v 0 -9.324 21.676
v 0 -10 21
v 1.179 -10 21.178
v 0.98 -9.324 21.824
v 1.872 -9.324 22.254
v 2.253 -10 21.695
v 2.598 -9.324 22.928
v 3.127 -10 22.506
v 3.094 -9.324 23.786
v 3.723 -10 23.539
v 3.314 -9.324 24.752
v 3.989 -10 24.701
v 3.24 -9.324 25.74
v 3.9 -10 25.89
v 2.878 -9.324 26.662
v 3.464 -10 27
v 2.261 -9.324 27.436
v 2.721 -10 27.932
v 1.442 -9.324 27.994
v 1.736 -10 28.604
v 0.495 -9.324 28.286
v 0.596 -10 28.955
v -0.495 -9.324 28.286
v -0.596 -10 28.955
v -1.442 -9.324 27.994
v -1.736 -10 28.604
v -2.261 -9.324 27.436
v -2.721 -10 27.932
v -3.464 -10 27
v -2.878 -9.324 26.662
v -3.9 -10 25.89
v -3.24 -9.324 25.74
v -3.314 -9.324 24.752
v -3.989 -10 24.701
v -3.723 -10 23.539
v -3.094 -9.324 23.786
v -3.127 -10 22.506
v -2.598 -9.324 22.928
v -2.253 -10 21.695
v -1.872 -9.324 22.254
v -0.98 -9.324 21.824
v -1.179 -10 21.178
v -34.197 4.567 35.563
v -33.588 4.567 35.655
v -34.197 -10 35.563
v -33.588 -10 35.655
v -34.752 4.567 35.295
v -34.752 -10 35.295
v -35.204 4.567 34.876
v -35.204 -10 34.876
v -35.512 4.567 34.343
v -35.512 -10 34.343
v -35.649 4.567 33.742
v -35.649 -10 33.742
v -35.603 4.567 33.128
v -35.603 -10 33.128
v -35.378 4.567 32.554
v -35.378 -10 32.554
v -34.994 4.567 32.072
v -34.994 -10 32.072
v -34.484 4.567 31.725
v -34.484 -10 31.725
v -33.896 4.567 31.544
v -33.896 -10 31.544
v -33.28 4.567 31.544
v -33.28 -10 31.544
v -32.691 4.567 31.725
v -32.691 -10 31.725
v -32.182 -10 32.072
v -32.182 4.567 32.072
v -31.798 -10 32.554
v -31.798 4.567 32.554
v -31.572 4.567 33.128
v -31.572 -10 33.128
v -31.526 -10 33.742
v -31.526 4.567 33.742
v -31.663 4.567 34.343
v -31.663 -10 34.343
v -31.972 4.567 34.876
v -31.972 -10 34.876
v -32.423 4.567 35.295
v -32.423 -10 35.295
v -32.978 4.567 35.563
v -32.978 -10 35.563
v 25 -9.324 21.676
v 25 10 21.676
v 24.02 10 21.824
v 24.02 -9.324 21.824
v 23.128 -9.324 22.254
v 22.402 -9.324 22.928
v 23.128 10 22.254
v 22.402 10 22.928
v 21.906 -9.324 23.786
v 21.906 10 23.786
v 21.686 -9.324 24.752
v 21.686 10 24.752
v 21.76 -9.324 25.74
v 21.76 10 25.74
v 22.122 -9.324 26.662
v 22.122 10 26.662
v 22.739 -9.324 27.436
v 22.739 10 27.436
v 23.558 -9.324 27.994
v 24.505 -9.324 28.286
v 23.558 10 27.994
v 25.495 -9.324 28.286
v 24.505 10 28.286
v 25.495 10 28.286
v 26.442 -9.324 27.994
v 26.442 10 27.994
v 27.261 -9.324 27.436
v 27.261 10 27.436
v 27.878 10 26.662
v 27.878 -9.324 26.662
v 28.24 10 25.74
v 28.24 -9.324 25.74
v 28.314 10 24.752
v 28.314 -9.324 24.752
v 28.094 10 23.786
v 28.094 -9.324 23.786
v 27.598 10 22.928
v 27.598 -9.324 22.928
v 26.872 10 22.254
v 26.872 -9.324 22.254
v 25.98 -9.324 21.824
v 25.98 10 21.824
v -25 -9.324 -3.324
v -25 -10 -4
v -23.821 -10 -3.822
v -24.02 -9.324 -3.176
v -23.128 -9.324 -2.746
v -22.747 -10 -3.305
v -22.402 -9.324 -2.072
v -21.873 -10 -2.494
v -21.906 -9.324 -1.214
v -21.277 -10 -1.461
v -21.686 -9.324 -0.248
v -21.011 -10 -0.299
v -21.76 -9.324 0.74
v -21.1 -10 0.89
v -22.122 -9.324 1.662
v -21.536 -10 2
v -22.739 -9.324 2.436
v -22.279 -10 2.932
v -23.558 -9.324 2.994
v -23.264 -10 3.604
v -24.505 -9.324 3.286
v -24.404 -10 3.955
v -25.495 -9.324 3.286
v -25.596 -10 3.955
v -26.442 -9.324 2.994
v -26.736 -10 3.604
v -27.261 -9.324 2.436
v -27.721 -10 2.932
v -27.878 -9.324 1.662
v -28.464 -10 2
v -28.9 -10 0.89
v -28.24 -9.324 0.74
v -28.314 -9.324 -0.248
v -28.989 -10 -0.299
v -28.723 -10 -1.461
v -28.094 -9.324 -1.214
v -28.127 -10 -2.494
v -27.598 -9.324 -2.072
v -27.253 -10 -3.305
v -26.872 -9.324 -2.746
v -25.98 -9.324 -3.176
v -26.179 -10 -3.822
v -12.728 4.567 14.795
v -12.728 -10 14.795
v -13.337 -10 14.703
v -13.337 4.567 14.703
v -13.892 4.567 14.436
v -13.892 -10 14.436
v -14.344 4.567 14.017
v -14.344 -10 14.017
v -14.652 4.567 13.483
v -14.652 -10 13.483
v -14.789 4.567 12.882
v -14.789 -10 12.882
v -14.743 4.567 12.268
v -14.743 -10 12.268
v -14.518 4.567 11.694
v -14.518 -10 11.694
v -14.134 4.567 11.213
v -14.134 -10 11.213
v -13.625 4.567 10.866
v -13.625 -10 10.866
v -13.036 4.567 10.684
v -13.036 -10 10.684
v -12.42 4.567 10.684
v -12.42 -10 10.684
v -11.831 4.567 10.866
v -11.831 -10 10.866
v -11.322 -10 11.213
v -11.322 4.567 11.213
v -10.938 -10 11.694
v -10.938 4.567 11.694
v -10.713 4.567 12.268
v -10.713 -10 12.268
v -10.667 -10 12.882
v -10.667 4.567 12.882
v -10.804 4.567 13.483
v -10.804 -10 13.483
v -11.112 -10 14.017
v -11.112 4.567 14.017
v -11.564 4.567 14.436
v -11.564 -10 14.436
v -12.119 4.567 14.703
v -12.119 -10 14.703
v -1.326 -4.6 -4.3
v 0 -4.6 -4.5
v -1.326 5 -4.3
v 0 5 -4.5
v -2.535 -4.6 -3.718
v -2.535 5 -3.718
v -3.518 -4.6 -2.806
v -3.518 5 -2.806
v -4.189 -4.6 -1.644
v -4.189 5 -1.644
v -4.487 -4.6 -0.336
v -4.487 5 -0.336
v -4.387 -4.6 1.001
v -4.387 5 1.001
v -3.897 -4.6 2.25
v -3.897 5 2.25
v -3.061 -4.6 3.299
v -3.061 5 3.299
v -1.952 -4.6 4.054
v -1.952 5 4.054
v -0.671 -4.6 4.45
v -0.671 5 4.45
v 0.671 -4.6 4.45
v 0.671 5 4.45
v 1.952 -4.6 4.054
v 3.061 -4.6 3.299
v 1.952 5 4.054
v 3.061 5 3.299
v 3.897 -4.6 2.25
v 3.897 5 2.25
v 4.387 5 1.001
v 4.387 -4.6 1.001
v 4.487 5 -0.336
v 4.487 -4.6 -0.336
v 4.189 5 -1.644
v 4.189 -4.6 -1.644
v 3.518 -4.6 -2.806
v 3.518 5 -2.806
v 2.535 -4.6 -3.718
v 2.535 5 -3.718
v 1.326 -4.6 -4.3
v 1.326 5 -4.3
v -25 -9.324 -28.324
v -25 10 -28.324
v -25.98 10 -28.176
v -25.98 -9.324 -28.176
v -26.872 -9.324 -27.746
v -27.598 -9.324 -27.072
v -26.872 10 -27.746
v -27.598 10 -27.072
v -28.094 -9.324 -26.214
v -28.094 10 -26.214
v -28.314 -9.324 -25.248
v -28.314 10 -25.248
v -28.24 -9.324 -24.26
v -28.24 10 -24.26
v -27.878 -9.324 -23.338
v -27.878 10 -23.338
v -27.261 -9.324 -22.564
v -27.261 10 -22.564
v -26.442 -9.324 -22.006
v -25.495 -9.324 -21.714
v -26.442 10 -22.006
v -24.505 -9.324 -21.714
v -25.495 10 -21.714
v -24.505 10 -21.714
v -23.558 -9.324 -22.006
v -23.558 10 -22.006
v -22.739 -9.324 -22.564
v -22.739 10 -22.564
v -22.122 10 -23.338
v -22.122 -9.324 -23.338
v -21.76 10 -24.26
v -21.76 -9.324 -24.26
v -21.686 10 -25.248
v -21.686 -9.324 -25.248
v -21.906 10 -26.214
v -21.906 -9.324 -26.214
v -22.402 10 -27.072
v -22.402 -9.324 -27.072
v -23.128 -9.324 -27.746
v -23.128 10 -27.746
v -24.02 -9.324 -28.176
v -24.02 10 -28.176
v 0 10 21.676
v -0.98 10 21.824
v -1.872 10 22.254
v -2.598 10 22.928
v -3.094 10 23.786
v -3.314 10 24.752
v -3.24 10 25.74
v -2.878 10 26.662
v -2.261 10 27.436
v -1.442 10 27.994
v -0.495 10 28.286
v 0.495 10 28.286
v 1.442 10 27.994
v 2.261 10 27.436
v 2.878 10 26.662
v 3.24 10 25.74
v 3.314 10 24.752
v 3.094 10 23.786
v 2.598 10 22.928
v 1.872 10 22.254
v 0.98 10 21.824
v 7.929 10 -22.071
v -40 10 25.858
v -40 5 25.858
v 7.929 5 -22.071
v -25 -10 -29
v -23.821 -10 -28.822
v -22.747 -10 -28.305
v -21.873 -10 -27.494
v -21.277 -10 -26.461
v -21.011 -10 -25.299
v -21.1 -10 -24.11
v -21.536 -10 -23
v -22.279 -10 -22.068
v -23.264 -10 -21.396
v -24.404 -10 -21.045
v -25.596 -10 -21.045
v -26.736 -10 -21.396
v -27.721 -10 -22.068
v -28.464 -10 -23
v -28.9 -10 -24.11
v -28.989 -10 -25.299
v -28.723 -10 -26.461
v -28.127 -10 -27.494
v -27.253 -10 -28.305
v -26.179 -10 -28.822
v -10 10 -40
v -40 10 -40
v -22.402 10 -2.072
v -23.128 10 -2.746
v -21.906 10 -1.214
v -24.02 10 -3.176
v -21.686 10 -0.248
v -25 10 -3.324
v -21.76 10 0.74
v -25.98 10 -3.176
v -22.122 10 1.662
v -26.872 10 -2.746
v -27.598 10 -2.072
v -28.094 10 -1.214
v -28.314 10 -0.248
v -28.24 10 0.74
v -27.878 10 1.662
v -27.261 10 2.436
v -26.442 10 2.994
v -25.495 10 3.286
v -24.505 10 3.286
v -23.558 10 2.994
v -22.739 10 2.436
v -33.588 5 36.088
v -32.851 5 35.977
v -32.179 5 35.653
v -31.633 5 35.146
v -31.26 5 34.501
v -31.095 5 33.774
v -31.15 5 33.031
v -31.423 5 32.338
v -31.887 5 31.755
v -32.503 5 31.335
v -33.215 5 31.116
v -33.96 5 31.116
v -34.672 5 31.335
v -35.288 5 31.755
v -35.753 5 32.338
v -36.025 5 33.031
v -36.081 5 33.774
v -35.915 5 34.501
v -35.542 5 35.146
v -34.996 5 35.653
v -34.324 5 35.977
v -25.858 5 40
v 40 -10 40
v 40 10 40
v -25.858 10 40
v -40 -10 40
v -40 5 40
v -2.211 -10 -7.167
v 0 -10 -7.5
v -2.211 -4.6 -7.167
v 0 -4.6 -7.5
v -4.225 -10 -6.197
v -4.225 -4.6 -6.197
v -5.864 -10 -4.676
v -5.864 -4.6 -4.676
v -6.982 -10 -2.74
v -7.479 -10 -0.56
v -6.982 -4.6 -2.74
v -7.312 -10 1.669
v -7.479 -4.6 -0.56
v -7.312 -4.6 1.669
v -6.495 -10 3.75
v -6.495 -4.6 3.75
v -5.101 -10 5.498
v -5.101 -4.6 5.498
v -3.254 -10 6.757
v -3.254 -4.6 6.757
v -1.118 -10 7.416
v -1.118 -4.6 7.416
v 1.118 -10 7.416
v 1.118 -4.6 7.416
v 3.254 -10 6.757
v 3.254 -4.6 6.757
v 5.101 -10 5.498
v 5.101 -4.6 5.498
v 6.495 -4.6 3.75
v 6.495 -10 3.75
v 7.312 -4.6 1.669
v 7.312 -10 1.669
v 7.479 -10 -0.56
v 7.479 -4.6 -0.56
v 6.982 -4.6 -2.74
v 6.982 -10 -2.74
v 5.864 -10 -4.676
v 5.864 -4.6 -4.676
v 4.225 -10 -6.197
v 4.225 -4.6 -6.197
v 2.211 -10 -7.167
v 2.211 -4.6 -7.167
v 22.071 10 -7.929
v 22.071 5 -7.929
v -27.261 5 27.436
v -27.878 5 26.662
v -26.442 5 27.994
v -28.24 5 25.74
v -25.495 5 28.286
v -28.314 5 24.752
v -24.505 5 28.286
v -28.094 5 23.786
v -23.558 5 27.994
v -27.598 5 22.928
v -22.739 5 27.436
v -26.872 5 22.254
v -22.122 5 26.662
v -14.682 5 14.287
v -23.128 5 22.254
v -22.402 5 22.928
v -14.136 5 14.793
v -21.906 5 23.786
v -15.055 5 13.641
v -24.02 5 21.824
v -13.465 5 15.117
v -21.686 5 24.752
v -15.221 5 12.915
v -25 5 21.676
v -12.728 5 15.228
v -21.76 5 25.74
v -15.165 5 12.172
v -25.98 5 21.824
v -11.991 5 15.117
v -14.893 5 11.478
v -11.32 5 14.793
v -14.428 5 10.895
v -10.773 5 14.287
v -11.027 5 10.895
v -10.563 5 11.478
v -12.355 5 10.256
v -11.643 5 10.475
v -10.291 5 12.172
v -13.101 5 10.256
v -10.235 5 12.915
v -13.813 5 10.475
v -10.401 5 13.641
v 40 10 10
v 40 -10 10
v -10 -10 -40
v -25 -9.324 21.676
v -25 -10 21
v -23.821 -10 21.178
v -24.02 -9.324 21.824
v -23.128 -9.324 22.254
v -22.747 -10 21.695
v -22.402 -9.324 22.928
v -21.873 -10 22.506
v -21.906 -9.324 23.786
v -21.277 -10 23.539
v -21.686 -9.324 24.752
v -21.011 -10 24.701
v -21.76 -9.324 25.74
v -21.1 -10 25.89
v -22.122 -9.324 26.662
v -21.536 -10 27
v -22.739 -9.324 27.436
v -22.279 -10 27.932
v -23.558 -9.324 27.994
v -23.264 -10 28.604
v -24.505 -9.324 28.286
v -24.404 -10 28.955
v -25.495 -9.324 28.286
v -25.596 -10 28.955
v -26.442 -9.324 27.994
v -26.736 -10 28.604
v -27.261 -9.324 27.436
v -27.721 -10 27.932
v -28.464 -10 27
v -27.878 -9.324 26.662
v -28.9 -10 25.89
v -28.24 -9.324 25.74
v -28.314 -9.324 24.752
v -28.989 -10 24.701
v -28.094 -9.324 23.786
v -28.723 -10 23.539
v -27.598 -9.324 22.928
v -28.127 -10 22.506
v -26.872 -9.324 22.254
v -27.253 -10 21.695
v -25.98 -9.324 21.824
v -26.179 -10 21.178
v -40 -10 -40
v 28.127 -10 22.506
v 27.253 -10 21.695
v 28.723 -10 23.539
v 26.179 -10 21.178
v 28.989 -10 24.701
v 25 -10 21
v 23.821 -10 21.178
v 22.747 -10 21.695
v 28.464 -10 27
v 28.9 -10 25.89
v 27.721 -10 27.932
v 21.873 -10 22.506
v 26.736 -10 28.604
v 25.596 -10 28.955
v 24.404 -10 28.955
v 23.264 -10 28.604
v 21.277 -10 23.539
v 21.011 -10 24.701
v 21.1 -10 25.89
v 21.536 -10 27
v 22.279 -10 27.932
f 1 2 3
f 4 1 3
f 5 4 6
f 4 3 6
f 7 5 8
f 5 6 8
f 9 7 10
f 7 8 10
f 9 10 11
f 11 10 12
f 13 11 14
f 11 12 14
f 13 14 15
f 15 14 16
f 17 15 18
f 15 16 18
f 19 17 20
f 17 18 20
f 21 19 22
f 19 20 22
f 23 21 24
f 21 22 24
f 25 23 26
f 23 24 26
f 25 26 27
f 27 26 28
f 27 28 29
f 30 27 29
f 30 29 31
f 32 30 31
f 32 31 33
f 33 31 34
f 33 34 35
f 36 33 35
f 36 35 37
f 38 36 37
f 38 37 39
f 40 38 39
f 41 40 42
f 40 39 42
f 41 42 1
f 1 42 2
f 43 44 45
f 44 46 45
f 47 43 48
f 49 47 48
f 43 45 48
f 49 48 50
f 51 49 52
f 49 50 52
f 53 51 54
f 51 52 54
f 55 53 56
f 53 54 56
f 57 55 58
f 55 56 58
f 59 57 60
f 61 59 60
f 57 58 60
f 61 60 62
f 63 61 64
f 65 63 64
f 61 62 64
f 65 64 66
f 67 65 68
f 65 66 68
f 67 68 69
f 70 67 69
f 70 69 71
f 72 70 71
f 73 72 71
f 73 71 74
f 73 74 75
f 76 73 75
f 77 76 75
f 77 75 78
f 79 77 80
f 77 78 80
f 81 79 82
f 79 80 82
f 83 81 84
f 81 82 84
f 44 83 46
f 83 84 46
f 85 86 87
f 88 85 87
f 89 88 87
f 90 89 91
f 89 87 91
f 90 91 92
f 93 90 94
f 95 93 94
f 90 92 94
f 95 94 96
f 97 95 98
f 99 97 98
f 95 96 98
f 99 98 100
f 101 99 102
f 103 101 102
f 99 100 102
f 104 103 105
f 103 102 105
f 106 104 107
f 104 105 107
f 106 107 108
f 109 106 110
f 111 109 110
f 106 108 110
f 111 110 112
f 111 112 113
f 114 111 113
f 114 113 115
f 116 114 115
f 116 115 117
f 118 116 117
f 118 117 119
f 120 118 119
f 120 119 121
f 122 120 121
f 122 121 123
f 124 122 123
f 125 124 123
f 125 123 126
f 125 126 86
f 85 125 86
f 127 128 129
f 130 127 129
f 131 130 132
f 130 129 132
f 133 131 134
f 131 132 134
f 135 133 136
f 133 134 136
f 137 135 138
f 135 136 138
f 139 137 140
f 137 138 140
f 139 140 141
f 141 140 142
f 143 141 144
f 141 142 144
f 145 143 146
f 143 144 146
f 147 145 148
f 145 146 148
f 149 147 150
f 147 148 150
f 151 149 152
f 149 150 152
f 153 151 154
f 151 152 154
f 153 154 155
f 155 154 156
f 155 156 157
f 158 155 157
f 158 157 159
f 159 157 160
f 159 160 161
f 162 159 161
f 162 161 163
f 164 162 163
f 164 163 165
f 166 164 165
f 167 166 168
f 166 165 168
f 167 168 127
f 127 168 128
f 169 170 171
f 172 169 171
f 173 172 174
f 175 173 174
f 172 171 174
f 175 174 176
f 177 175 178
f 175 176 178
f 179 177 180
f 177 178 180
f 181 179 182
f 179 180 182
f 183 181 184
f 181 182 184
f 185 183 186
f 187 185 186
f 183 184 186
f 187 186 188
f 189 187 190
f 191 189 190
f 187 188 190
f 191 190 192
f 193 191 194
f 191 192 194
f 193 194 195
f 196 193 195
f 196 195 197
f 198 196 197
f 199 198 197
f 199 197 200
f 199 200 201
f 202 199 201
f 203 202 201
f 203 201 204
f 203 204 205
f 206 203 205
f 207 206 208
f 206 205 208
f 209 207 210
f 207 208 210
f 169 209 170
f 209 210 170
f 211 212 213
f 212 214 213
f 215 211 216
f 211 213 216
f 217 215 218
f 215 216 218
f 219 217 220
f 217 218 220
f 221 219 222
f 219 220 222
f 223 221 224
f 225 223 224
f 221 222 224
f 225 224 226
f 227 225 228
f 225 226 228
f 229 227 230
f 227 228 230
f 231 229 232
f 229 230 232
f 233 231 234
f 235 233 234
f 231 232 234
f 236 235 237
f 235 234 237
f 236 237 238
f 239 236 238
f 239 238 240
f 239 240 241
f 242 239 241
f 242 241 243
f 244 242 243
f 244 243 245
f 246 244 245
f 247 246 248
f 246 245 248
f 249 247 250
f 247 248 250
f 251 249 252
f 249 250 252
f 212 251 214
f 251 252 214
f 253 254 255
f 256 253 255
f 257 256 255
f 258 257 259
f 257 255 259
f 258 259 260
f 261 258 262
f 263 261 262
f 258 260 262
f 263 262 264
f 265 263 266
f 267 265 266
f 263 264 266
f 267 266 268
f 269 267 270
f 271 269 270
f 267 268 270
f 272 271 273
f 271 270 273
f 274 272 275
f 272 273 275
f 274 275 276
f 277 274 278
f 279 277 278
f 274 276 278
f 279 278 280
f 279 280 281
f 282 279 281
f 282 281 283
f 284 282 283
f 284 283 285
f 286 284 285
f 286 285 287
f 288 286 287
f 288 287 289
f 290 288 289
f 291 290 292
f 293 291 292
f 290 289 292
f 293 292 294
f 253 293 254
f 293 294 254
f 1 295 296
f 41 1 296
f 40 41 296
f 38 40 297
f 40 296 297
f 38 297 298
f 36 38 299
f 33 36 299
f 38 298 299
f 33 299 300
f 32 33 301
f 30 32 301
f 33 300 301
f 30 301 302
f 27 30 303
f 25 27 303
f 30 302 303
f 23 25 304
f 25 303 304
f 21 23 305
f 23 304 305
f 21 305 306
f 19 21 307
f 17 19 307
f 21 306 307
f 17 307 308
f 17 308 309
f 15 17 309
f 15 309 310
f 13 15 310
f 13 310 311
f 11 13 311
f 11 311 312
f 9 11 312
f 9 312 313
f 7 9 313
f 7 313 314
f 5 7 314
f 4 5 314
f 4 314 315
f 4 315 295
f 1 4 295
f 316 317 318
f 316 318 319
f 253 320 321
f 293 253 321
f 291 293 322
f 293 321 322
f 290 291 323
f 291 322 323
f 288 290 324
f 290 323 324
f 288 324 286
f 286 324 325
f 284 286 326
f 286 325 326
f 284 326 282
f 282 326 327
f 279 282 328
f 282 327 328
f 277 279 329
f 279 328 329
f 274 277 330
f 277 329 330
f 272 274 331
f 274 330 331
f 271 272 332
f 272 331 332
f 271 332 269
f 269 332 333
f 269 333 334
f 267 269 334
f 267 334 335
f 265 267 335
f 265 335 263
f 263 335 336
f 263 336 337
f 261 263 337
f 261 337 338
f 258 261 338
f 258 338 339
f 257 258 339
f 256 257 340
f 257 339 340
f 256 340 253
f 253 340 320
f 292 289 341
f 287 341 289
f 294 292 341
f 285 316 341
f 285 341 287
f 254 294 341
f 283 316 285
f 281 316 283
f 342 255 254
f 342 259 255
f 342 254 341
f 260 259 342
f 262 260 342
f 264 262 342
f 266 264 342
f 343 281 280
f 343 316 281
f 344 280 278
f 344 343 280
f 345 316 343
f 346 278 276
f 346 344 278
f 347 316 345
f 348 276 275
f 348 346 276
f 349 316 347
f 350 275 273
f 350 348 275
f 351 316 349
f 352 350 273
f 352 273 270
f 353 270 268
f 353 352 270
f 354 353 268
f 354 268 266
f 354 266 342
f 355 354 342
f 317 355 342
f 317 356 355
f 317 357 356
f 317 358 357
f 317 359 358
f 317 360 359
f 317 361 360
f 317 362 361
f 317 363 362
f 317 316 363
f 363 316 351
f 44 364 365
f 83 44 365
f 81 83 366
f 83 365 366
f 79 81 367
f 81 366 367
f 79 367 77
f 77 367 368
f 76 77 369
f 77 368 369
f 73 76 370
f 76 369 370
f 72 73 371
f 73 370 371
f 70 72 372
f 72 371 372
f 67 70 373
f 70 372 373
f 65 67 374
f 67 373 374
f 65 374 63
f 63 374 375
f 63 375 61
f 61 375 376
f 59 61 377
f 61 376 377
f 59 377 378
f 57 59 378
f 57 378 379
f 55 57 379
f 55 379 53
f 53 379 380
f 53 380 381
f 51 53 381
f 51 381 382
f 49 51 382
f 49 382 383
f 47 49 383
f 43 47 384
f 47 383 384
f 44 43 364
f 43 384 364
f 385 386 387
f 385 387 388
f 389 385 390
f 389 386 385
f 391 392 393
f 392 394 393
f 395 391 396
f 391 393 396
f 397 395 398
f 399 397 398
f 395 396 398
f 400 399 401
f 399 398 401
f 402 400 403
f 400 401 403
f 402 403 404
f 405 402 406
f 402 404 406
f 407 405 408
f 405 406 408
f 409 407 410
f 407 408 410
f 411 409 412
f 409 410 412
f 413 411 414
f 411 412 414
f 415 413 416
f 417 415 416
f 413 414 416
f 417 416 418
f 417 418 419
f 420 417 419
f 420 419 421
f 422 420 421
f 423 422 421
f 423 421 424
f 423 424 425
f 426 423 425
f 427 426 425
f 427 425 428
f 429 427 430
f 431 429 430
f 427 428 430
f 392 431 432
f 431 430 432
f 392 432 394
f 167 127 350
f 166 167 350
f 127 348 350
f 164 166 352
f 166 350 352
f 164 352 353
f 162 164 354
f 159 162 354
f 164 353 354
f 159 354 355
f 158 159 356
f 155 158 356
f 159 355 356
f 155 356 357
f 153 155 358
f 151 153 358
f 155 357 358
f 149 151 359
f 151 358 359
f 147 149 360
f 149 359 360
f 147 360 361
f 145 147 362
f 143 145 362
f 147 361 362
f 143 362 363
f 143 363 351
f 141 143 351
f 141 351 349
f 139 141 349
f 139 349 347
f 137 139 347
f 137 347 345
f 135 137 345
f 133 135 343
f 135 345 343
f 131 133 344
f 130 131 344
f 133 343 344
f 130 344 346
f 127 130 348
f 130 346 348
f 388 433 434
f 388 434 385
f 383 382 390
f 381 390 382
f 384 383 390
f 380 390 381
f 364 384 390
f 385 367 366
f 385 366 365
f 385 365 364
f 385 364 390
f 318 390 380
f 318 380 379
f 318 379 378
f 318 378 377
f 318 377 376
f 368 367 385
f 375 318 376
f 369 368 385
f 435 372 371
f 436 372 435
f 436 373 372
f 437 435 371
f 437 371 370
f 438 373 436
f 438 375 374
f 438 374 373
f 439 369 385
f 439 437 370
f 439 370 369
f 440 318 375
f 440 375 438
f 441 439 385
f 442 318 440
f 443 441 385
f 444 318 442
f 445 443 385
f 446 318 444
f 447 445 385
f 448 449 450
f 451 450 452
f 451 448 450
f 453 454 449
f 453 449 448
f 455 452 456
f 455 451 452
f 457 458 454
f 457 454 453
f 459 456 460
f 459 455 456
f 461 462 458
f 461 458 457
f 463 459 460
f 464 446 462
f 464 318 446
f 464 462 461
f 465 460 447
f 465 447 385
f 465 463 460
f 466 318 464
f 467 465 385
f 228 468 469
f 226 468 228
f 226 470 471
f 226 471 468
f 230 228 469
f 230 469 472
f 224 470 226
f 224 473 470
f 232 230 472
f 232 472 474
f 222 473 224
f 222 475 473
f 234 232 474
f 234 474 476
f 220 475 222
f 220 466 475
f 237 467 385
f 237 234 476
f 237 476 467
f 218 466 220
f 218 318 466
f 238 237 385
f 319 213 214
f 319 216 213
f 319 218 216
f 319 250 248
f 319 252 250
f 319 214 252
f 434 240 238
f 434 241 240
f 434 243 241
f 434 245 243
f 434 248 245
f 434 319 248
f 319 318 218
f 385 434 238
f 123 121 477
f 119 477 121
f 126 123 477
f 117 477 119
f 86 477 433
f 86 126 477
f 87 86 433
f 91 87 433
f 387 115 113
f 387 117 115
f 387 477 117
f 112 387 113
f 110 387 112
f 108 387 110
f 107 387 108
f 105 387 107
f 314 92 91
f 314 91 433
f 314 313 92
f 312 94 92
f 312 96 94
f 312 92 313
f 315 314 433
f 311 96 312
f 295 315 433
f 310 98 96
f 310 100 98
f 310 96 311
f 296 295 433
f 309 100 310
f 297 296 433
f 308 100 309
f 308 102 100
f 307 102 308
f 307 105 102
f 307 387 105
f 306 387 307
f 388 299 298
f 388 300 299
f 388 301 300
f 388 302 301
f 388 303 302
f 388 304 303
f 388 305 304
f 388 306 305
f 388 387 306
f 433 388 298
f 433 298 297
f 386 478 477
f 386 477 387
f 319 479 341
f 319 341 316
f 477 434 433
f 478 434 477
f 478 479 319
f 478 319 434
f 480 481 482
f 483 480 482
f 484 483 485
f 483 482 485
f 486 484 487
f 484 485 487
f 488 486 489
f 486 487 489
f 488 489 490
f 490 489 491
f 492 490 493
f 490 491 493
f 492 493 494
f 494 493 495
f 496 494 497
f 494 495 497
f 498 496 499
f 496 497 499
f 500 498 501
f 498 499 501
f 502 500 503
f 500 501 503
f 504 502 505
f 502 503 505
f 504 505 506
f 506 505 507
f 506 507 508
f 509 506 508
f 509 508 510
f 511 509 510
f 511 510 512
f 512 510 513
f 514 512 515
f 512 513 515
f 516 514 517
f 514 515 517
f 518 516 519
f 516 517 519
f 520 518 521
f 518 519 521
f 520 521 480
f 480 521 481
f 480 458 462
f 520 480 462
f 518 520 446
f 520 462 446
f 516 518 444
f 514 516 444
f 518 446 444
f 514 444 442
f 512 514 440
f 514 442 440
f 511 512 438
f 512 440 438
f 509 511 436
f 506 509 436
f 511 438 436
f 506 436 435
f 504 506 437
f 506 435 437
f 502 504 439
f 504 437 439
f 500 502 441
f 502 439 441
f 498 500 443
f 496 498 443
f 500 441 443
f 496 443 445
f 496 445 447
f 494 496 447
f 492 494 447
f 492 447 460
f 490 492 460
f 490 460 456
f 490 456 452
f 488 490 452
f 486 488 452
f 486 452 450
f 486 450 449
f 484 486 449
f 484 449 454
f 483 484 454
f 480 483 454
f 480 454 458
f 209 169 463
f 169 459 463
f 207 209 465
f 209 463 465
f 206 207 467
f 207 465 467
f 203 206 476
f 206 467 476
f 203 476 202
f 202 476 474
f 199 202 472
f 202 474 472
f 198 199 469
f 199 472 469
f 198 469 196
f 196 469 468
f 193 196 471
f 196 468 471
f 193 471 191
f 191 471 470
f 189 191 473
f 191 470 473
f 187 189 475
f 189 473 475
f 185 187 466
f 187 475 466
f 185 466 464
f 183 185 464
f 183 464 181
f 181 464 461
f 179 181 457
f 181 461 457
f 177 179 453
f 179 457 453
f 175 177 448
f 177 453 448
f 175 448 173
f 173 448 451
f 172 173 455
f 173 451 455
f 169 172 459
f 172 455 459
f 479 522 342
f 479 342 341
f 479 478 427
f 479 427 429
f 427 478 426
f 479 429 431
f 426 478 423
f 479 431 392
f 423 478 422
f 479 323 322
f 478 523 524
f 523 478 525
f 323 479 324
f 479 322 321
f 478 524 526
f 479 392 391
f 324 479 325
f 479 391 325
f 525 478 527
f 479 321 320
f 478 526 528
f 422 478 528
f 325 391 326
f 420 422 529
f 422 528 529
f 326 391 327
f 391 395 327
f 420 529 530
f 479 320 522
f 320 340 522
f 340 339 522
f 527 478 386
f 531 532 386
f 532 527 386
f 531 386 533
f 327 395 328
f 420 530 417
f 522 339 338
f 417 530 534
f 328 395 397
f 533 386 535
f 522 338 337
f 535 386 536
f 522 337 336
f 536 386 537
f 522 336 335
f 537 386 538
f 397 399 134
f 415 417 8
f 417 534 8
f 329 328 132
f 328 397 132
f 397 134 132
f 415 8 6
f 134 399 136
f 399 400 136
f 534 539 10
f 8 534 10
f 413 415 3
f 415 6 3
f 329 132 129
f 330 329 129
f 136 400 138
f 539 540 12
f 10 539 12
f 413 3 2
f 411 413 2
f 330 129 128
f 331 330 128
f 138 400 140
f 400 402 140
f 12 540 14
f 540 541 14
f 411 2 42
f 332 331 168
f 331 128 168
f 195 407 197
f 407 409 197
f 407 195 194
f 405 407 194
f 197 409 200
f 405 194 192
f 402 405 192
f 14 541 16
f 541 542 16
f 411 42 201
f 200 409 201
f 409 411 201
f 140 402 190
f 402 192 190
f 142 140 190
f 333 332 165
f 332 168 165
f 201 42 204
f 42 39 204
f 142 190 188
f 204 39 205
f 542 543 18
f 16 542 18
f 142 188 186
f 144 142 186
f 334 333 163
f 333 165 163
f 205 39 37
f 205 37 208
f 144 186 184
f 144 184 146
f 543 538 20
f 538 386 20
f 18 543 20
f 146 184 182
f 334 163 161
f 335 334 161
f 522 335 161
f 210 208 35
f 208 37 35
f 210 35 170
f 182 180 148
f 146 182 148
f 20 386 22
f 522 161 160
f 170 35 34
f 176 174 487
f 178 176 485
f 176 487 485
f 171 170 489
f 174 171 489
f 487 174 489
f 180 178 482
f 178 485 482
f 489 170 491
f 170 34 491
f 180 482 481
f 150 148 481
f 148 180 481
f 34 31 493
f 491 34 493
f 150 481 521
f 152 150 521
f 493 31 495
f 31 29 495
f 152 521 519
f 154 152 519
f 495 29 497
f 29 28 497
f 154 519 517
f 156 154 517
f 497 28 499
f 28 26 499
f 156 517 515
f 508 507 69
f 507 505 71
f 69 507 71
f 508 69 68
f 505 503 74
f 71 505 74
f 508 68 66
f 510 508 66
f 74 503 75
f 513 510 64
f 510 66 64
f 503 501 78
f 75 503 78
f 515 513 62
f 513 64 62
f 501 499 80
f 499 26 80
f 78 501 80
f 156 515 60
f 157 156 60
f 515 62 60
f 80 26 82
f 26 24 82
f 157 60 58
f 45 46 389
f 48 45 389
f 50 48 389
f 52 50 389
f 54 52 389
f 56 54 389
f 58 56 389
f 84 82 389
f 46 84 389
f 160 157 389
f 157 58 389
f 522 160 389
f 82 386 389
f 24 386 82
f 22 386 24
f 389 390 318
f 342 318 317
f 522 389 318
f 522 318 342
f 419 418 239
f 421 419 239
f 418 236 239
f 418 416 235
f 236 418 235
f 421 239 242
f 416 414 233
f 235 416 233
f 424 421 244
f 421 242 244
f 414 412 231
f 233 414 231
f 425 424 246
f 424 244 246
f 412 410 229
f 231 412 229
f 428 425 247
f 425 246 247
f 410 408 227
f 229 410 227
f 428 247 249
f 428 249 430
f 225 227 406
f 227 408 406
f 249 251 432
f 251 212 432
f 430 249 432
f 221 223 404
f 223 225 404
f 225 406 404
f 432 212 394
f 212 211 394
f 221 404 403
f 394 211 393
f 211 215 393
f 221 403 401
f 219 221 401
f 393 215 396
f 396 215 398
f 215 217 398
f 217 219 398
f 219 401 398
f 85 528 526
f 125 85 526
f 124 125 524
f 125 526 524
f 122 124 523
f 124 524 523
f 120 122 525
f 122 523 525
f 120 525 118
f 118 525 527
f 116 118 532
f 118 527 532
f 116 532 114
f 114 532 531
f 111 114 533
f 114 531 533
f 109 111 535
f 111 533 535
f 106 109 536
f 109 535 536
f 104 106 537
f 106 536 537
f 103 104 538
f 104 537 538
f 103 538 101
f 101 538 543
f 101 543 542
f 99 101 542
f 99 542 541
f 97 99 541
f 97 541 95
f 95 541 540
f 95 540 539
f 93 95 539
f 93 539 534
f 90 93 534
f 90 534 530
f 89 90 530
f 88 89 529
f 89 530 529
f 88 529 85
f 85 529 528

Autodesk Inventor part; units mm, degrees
ref_plane "YZ Plane" through (0, 0, 0) normal (1, 0, 0) x (0, 1, 0)
ref_plane "XZ Plane" through (0, 0, 0) normal (0, 1, 0) x (-1, 0, 0)
ref_plane "XY Plane" through (0, 0, 0) normal (0, 0, 1) x (1, 0, 0)
sketch "Basisskizze" plane through (0, 0, 0) normal (0, 1, 0) x (-1, 0, 0)
  line L0 (0, -56) -> (0, 56) construction
  line L1 (56, 0) -> (-56, 0) construction
  line L2 (40, -40) -> (-40, -40)
  line L3 (-40, -40) -> (-40, 40)
  line L4 (-40, 40) -> (40, 40)
  line L5 (40, 40) -> (40, -40)
  line L6 (10, -40) -> (10, 10) construction
  line L7 (10, 10) -> (-40, 10) construction
  point P0 (0, 0)
  dimension "d2" = 80
  dimension "d3" = 30
  dimension "d4" = 30
extrude "Grundkörper" add sketch "Basisskizze" along normal mid plane 20
sketch "Skizze5" plane through (0, -10, 0) normal (0, -1, 0) x (1, 0, 0)
  line L0 (-10, -40) -> (40, 10)
  line L1 (40, 40) -> (-40, 40) projected
  line L2 (-40, 40) -> (-40, -40) projected
  line L3 (-40, -40) -> (40, -40) projected
  line L4 (40, -40) -> (40, 40) projected
  point P0 (0, 0)
  dimension "d19" = 30
  dimension "d20" = 30
extrude "Abschnitt" cut sketch "Skizze5" against normal through all contours L0 L4 L3
sketch "Skizze6" plane through (0, -10, 0) normal (0, -1, 0) x (1, 0, 0)
  line L0 (-10, -40) -> (40, 10) projected
  line L1 (-40, -40) -> (-40, 40) projected
  line L2 (15, -15) -> (-40, 40) construction
  line L3 (-40, -40) -> (-10, -40) projected
  line L4 (-10, -40) -> (-10, 40)
  line L5 (-40, 40) -> (40, 40) projected
  line L6 (40, 10) -> (-40, 10)
  point P0 (0, 0)
  point P1 (0, 0)
  dimension "d23" = 40
  dimension "d24" = 21.2132
hole "DIN7984_M8" at (0, -10, 0) direction (0, 1, 0) diameter 9 end through all counterbore diameter 15 counterbore depth 5.4
sketch "Skizze7" plane through (0, 10, 0) normal (0, 1, 0) x (1, 0, 0)
  line L0 (40, -10) -> (-10, 40) construction
  line L1 (15, 15) -> (-40, -40) construction
  line L2 (22.0711, 7.9289) -> (-32.9289, -47.0711)
  line L3 (-32.9289, -47.0711) -> (-47.0711, -32.9289)
  line L4 (-47.0711, -32.9289) -> (7.9289, 22.0711)
  line L5 (7.9289, 22.0711) -> (22.0711, 7.9289)
  point P0 (0, 0)
  dimension "d32" = 20
extrude "NUT_Torsionssicherung" cut sketch "Skizze7" against normal blind 5
sketch "Skizze8" plane through (0, -10, 0) normal (0, -1, 0) x (1, 0, 0)
  line L0 (-10, -40) -> (-40, -40) projected
  line L1 (-25.8579, 40) -> (40, 40) projected
  line L2 (-40, 40) -> (-40, -40) projected
  line L3 (-40, 25.8579) -> (7.9289, -22.0711) projected
  line L4 (-25, -40) -> (-25, 40) construction
  line L5 (40, 40) -> (-40, 40) projected
  line L6 (-40, -40) -> (-10, -40) projected
  line L7 (40, 40) -> (40, 10) projected
  line L8 (40, 25) -> (-40, 25) construction
  line L9 (40, 10) -> (40, 40) projected
  point P0 (0, 0)
  point P1 (-25, 25)
  point P2 (-25, 0)
  point P3 (-25, -25)
  point P4 (0, 25)
  point P5 (25, 25)
  dimension "d38" = 15
  dimension "d39" = 15
  dimension "d43" = 25
  dimension "d48" = 25
  dimension "d49" = 25
hole "M8_Profilgewinde" at (-25, -10, 25) at (-25, -10, 0) at (-25, -10, -25) at (0, -10, 25) at (25, -10, 25) direction (0, 1, 0) diameter 6.647 end through all countersink diameter 8 countersink angle 90 thread size "M8x1.25" class "6H" standard "ISO Metric profile"
sketch "Skizze9" plane through (0, 5, 0) normal (0, 1, 0) x (1, 0, 0)
  circle A0 centre (-25, -25) radius 3.3235 construction
  circle A1 centre (0, 0) radius 4.5 construction
  line L0 (40, -40) -> (-40, -40) projected
  line L1 (-40, -40) -> (0, 0) construction
  line L2 (-17.9289, -32.0711) -> (-32.0711, -17.9289) construction
  line L3 (-40, -25.8579) -> (7.9289, 22.0711) projected
  line L4 (22.0711, 7.9289) -> (-25.8579, -40) projected
  line L5 (-40, 40) -> (-40, -25.8579) projected
  line L6 (7.9289, 22.0711) -> (22.0711, 7.9289) projected
  point P0 (0, 0)
  point P1 (-12.7279, -12.7279)
  point P2 (-33.5876, -33.5876)
  dimension "d72" = 18
  dimension "d73" = 47.5
hole "M5_Bohrung" at (-12.7279, 5, 12.7279) at (-33.5876, 5, 33.5876) direction (0, -1, 0) diameter 4.134 end through all countersink diameter 5 countersink angle 90 thread size "M5x0.8" class "6H" standard "ISO Metric profile"
equation "\"d4\" = d3"
equation "\"d48\" = d43"
equation "\"d49\" = d48"
properties part number "200-20-ROCKER-CONNECTOR-04" material "Aluminium 6061"
